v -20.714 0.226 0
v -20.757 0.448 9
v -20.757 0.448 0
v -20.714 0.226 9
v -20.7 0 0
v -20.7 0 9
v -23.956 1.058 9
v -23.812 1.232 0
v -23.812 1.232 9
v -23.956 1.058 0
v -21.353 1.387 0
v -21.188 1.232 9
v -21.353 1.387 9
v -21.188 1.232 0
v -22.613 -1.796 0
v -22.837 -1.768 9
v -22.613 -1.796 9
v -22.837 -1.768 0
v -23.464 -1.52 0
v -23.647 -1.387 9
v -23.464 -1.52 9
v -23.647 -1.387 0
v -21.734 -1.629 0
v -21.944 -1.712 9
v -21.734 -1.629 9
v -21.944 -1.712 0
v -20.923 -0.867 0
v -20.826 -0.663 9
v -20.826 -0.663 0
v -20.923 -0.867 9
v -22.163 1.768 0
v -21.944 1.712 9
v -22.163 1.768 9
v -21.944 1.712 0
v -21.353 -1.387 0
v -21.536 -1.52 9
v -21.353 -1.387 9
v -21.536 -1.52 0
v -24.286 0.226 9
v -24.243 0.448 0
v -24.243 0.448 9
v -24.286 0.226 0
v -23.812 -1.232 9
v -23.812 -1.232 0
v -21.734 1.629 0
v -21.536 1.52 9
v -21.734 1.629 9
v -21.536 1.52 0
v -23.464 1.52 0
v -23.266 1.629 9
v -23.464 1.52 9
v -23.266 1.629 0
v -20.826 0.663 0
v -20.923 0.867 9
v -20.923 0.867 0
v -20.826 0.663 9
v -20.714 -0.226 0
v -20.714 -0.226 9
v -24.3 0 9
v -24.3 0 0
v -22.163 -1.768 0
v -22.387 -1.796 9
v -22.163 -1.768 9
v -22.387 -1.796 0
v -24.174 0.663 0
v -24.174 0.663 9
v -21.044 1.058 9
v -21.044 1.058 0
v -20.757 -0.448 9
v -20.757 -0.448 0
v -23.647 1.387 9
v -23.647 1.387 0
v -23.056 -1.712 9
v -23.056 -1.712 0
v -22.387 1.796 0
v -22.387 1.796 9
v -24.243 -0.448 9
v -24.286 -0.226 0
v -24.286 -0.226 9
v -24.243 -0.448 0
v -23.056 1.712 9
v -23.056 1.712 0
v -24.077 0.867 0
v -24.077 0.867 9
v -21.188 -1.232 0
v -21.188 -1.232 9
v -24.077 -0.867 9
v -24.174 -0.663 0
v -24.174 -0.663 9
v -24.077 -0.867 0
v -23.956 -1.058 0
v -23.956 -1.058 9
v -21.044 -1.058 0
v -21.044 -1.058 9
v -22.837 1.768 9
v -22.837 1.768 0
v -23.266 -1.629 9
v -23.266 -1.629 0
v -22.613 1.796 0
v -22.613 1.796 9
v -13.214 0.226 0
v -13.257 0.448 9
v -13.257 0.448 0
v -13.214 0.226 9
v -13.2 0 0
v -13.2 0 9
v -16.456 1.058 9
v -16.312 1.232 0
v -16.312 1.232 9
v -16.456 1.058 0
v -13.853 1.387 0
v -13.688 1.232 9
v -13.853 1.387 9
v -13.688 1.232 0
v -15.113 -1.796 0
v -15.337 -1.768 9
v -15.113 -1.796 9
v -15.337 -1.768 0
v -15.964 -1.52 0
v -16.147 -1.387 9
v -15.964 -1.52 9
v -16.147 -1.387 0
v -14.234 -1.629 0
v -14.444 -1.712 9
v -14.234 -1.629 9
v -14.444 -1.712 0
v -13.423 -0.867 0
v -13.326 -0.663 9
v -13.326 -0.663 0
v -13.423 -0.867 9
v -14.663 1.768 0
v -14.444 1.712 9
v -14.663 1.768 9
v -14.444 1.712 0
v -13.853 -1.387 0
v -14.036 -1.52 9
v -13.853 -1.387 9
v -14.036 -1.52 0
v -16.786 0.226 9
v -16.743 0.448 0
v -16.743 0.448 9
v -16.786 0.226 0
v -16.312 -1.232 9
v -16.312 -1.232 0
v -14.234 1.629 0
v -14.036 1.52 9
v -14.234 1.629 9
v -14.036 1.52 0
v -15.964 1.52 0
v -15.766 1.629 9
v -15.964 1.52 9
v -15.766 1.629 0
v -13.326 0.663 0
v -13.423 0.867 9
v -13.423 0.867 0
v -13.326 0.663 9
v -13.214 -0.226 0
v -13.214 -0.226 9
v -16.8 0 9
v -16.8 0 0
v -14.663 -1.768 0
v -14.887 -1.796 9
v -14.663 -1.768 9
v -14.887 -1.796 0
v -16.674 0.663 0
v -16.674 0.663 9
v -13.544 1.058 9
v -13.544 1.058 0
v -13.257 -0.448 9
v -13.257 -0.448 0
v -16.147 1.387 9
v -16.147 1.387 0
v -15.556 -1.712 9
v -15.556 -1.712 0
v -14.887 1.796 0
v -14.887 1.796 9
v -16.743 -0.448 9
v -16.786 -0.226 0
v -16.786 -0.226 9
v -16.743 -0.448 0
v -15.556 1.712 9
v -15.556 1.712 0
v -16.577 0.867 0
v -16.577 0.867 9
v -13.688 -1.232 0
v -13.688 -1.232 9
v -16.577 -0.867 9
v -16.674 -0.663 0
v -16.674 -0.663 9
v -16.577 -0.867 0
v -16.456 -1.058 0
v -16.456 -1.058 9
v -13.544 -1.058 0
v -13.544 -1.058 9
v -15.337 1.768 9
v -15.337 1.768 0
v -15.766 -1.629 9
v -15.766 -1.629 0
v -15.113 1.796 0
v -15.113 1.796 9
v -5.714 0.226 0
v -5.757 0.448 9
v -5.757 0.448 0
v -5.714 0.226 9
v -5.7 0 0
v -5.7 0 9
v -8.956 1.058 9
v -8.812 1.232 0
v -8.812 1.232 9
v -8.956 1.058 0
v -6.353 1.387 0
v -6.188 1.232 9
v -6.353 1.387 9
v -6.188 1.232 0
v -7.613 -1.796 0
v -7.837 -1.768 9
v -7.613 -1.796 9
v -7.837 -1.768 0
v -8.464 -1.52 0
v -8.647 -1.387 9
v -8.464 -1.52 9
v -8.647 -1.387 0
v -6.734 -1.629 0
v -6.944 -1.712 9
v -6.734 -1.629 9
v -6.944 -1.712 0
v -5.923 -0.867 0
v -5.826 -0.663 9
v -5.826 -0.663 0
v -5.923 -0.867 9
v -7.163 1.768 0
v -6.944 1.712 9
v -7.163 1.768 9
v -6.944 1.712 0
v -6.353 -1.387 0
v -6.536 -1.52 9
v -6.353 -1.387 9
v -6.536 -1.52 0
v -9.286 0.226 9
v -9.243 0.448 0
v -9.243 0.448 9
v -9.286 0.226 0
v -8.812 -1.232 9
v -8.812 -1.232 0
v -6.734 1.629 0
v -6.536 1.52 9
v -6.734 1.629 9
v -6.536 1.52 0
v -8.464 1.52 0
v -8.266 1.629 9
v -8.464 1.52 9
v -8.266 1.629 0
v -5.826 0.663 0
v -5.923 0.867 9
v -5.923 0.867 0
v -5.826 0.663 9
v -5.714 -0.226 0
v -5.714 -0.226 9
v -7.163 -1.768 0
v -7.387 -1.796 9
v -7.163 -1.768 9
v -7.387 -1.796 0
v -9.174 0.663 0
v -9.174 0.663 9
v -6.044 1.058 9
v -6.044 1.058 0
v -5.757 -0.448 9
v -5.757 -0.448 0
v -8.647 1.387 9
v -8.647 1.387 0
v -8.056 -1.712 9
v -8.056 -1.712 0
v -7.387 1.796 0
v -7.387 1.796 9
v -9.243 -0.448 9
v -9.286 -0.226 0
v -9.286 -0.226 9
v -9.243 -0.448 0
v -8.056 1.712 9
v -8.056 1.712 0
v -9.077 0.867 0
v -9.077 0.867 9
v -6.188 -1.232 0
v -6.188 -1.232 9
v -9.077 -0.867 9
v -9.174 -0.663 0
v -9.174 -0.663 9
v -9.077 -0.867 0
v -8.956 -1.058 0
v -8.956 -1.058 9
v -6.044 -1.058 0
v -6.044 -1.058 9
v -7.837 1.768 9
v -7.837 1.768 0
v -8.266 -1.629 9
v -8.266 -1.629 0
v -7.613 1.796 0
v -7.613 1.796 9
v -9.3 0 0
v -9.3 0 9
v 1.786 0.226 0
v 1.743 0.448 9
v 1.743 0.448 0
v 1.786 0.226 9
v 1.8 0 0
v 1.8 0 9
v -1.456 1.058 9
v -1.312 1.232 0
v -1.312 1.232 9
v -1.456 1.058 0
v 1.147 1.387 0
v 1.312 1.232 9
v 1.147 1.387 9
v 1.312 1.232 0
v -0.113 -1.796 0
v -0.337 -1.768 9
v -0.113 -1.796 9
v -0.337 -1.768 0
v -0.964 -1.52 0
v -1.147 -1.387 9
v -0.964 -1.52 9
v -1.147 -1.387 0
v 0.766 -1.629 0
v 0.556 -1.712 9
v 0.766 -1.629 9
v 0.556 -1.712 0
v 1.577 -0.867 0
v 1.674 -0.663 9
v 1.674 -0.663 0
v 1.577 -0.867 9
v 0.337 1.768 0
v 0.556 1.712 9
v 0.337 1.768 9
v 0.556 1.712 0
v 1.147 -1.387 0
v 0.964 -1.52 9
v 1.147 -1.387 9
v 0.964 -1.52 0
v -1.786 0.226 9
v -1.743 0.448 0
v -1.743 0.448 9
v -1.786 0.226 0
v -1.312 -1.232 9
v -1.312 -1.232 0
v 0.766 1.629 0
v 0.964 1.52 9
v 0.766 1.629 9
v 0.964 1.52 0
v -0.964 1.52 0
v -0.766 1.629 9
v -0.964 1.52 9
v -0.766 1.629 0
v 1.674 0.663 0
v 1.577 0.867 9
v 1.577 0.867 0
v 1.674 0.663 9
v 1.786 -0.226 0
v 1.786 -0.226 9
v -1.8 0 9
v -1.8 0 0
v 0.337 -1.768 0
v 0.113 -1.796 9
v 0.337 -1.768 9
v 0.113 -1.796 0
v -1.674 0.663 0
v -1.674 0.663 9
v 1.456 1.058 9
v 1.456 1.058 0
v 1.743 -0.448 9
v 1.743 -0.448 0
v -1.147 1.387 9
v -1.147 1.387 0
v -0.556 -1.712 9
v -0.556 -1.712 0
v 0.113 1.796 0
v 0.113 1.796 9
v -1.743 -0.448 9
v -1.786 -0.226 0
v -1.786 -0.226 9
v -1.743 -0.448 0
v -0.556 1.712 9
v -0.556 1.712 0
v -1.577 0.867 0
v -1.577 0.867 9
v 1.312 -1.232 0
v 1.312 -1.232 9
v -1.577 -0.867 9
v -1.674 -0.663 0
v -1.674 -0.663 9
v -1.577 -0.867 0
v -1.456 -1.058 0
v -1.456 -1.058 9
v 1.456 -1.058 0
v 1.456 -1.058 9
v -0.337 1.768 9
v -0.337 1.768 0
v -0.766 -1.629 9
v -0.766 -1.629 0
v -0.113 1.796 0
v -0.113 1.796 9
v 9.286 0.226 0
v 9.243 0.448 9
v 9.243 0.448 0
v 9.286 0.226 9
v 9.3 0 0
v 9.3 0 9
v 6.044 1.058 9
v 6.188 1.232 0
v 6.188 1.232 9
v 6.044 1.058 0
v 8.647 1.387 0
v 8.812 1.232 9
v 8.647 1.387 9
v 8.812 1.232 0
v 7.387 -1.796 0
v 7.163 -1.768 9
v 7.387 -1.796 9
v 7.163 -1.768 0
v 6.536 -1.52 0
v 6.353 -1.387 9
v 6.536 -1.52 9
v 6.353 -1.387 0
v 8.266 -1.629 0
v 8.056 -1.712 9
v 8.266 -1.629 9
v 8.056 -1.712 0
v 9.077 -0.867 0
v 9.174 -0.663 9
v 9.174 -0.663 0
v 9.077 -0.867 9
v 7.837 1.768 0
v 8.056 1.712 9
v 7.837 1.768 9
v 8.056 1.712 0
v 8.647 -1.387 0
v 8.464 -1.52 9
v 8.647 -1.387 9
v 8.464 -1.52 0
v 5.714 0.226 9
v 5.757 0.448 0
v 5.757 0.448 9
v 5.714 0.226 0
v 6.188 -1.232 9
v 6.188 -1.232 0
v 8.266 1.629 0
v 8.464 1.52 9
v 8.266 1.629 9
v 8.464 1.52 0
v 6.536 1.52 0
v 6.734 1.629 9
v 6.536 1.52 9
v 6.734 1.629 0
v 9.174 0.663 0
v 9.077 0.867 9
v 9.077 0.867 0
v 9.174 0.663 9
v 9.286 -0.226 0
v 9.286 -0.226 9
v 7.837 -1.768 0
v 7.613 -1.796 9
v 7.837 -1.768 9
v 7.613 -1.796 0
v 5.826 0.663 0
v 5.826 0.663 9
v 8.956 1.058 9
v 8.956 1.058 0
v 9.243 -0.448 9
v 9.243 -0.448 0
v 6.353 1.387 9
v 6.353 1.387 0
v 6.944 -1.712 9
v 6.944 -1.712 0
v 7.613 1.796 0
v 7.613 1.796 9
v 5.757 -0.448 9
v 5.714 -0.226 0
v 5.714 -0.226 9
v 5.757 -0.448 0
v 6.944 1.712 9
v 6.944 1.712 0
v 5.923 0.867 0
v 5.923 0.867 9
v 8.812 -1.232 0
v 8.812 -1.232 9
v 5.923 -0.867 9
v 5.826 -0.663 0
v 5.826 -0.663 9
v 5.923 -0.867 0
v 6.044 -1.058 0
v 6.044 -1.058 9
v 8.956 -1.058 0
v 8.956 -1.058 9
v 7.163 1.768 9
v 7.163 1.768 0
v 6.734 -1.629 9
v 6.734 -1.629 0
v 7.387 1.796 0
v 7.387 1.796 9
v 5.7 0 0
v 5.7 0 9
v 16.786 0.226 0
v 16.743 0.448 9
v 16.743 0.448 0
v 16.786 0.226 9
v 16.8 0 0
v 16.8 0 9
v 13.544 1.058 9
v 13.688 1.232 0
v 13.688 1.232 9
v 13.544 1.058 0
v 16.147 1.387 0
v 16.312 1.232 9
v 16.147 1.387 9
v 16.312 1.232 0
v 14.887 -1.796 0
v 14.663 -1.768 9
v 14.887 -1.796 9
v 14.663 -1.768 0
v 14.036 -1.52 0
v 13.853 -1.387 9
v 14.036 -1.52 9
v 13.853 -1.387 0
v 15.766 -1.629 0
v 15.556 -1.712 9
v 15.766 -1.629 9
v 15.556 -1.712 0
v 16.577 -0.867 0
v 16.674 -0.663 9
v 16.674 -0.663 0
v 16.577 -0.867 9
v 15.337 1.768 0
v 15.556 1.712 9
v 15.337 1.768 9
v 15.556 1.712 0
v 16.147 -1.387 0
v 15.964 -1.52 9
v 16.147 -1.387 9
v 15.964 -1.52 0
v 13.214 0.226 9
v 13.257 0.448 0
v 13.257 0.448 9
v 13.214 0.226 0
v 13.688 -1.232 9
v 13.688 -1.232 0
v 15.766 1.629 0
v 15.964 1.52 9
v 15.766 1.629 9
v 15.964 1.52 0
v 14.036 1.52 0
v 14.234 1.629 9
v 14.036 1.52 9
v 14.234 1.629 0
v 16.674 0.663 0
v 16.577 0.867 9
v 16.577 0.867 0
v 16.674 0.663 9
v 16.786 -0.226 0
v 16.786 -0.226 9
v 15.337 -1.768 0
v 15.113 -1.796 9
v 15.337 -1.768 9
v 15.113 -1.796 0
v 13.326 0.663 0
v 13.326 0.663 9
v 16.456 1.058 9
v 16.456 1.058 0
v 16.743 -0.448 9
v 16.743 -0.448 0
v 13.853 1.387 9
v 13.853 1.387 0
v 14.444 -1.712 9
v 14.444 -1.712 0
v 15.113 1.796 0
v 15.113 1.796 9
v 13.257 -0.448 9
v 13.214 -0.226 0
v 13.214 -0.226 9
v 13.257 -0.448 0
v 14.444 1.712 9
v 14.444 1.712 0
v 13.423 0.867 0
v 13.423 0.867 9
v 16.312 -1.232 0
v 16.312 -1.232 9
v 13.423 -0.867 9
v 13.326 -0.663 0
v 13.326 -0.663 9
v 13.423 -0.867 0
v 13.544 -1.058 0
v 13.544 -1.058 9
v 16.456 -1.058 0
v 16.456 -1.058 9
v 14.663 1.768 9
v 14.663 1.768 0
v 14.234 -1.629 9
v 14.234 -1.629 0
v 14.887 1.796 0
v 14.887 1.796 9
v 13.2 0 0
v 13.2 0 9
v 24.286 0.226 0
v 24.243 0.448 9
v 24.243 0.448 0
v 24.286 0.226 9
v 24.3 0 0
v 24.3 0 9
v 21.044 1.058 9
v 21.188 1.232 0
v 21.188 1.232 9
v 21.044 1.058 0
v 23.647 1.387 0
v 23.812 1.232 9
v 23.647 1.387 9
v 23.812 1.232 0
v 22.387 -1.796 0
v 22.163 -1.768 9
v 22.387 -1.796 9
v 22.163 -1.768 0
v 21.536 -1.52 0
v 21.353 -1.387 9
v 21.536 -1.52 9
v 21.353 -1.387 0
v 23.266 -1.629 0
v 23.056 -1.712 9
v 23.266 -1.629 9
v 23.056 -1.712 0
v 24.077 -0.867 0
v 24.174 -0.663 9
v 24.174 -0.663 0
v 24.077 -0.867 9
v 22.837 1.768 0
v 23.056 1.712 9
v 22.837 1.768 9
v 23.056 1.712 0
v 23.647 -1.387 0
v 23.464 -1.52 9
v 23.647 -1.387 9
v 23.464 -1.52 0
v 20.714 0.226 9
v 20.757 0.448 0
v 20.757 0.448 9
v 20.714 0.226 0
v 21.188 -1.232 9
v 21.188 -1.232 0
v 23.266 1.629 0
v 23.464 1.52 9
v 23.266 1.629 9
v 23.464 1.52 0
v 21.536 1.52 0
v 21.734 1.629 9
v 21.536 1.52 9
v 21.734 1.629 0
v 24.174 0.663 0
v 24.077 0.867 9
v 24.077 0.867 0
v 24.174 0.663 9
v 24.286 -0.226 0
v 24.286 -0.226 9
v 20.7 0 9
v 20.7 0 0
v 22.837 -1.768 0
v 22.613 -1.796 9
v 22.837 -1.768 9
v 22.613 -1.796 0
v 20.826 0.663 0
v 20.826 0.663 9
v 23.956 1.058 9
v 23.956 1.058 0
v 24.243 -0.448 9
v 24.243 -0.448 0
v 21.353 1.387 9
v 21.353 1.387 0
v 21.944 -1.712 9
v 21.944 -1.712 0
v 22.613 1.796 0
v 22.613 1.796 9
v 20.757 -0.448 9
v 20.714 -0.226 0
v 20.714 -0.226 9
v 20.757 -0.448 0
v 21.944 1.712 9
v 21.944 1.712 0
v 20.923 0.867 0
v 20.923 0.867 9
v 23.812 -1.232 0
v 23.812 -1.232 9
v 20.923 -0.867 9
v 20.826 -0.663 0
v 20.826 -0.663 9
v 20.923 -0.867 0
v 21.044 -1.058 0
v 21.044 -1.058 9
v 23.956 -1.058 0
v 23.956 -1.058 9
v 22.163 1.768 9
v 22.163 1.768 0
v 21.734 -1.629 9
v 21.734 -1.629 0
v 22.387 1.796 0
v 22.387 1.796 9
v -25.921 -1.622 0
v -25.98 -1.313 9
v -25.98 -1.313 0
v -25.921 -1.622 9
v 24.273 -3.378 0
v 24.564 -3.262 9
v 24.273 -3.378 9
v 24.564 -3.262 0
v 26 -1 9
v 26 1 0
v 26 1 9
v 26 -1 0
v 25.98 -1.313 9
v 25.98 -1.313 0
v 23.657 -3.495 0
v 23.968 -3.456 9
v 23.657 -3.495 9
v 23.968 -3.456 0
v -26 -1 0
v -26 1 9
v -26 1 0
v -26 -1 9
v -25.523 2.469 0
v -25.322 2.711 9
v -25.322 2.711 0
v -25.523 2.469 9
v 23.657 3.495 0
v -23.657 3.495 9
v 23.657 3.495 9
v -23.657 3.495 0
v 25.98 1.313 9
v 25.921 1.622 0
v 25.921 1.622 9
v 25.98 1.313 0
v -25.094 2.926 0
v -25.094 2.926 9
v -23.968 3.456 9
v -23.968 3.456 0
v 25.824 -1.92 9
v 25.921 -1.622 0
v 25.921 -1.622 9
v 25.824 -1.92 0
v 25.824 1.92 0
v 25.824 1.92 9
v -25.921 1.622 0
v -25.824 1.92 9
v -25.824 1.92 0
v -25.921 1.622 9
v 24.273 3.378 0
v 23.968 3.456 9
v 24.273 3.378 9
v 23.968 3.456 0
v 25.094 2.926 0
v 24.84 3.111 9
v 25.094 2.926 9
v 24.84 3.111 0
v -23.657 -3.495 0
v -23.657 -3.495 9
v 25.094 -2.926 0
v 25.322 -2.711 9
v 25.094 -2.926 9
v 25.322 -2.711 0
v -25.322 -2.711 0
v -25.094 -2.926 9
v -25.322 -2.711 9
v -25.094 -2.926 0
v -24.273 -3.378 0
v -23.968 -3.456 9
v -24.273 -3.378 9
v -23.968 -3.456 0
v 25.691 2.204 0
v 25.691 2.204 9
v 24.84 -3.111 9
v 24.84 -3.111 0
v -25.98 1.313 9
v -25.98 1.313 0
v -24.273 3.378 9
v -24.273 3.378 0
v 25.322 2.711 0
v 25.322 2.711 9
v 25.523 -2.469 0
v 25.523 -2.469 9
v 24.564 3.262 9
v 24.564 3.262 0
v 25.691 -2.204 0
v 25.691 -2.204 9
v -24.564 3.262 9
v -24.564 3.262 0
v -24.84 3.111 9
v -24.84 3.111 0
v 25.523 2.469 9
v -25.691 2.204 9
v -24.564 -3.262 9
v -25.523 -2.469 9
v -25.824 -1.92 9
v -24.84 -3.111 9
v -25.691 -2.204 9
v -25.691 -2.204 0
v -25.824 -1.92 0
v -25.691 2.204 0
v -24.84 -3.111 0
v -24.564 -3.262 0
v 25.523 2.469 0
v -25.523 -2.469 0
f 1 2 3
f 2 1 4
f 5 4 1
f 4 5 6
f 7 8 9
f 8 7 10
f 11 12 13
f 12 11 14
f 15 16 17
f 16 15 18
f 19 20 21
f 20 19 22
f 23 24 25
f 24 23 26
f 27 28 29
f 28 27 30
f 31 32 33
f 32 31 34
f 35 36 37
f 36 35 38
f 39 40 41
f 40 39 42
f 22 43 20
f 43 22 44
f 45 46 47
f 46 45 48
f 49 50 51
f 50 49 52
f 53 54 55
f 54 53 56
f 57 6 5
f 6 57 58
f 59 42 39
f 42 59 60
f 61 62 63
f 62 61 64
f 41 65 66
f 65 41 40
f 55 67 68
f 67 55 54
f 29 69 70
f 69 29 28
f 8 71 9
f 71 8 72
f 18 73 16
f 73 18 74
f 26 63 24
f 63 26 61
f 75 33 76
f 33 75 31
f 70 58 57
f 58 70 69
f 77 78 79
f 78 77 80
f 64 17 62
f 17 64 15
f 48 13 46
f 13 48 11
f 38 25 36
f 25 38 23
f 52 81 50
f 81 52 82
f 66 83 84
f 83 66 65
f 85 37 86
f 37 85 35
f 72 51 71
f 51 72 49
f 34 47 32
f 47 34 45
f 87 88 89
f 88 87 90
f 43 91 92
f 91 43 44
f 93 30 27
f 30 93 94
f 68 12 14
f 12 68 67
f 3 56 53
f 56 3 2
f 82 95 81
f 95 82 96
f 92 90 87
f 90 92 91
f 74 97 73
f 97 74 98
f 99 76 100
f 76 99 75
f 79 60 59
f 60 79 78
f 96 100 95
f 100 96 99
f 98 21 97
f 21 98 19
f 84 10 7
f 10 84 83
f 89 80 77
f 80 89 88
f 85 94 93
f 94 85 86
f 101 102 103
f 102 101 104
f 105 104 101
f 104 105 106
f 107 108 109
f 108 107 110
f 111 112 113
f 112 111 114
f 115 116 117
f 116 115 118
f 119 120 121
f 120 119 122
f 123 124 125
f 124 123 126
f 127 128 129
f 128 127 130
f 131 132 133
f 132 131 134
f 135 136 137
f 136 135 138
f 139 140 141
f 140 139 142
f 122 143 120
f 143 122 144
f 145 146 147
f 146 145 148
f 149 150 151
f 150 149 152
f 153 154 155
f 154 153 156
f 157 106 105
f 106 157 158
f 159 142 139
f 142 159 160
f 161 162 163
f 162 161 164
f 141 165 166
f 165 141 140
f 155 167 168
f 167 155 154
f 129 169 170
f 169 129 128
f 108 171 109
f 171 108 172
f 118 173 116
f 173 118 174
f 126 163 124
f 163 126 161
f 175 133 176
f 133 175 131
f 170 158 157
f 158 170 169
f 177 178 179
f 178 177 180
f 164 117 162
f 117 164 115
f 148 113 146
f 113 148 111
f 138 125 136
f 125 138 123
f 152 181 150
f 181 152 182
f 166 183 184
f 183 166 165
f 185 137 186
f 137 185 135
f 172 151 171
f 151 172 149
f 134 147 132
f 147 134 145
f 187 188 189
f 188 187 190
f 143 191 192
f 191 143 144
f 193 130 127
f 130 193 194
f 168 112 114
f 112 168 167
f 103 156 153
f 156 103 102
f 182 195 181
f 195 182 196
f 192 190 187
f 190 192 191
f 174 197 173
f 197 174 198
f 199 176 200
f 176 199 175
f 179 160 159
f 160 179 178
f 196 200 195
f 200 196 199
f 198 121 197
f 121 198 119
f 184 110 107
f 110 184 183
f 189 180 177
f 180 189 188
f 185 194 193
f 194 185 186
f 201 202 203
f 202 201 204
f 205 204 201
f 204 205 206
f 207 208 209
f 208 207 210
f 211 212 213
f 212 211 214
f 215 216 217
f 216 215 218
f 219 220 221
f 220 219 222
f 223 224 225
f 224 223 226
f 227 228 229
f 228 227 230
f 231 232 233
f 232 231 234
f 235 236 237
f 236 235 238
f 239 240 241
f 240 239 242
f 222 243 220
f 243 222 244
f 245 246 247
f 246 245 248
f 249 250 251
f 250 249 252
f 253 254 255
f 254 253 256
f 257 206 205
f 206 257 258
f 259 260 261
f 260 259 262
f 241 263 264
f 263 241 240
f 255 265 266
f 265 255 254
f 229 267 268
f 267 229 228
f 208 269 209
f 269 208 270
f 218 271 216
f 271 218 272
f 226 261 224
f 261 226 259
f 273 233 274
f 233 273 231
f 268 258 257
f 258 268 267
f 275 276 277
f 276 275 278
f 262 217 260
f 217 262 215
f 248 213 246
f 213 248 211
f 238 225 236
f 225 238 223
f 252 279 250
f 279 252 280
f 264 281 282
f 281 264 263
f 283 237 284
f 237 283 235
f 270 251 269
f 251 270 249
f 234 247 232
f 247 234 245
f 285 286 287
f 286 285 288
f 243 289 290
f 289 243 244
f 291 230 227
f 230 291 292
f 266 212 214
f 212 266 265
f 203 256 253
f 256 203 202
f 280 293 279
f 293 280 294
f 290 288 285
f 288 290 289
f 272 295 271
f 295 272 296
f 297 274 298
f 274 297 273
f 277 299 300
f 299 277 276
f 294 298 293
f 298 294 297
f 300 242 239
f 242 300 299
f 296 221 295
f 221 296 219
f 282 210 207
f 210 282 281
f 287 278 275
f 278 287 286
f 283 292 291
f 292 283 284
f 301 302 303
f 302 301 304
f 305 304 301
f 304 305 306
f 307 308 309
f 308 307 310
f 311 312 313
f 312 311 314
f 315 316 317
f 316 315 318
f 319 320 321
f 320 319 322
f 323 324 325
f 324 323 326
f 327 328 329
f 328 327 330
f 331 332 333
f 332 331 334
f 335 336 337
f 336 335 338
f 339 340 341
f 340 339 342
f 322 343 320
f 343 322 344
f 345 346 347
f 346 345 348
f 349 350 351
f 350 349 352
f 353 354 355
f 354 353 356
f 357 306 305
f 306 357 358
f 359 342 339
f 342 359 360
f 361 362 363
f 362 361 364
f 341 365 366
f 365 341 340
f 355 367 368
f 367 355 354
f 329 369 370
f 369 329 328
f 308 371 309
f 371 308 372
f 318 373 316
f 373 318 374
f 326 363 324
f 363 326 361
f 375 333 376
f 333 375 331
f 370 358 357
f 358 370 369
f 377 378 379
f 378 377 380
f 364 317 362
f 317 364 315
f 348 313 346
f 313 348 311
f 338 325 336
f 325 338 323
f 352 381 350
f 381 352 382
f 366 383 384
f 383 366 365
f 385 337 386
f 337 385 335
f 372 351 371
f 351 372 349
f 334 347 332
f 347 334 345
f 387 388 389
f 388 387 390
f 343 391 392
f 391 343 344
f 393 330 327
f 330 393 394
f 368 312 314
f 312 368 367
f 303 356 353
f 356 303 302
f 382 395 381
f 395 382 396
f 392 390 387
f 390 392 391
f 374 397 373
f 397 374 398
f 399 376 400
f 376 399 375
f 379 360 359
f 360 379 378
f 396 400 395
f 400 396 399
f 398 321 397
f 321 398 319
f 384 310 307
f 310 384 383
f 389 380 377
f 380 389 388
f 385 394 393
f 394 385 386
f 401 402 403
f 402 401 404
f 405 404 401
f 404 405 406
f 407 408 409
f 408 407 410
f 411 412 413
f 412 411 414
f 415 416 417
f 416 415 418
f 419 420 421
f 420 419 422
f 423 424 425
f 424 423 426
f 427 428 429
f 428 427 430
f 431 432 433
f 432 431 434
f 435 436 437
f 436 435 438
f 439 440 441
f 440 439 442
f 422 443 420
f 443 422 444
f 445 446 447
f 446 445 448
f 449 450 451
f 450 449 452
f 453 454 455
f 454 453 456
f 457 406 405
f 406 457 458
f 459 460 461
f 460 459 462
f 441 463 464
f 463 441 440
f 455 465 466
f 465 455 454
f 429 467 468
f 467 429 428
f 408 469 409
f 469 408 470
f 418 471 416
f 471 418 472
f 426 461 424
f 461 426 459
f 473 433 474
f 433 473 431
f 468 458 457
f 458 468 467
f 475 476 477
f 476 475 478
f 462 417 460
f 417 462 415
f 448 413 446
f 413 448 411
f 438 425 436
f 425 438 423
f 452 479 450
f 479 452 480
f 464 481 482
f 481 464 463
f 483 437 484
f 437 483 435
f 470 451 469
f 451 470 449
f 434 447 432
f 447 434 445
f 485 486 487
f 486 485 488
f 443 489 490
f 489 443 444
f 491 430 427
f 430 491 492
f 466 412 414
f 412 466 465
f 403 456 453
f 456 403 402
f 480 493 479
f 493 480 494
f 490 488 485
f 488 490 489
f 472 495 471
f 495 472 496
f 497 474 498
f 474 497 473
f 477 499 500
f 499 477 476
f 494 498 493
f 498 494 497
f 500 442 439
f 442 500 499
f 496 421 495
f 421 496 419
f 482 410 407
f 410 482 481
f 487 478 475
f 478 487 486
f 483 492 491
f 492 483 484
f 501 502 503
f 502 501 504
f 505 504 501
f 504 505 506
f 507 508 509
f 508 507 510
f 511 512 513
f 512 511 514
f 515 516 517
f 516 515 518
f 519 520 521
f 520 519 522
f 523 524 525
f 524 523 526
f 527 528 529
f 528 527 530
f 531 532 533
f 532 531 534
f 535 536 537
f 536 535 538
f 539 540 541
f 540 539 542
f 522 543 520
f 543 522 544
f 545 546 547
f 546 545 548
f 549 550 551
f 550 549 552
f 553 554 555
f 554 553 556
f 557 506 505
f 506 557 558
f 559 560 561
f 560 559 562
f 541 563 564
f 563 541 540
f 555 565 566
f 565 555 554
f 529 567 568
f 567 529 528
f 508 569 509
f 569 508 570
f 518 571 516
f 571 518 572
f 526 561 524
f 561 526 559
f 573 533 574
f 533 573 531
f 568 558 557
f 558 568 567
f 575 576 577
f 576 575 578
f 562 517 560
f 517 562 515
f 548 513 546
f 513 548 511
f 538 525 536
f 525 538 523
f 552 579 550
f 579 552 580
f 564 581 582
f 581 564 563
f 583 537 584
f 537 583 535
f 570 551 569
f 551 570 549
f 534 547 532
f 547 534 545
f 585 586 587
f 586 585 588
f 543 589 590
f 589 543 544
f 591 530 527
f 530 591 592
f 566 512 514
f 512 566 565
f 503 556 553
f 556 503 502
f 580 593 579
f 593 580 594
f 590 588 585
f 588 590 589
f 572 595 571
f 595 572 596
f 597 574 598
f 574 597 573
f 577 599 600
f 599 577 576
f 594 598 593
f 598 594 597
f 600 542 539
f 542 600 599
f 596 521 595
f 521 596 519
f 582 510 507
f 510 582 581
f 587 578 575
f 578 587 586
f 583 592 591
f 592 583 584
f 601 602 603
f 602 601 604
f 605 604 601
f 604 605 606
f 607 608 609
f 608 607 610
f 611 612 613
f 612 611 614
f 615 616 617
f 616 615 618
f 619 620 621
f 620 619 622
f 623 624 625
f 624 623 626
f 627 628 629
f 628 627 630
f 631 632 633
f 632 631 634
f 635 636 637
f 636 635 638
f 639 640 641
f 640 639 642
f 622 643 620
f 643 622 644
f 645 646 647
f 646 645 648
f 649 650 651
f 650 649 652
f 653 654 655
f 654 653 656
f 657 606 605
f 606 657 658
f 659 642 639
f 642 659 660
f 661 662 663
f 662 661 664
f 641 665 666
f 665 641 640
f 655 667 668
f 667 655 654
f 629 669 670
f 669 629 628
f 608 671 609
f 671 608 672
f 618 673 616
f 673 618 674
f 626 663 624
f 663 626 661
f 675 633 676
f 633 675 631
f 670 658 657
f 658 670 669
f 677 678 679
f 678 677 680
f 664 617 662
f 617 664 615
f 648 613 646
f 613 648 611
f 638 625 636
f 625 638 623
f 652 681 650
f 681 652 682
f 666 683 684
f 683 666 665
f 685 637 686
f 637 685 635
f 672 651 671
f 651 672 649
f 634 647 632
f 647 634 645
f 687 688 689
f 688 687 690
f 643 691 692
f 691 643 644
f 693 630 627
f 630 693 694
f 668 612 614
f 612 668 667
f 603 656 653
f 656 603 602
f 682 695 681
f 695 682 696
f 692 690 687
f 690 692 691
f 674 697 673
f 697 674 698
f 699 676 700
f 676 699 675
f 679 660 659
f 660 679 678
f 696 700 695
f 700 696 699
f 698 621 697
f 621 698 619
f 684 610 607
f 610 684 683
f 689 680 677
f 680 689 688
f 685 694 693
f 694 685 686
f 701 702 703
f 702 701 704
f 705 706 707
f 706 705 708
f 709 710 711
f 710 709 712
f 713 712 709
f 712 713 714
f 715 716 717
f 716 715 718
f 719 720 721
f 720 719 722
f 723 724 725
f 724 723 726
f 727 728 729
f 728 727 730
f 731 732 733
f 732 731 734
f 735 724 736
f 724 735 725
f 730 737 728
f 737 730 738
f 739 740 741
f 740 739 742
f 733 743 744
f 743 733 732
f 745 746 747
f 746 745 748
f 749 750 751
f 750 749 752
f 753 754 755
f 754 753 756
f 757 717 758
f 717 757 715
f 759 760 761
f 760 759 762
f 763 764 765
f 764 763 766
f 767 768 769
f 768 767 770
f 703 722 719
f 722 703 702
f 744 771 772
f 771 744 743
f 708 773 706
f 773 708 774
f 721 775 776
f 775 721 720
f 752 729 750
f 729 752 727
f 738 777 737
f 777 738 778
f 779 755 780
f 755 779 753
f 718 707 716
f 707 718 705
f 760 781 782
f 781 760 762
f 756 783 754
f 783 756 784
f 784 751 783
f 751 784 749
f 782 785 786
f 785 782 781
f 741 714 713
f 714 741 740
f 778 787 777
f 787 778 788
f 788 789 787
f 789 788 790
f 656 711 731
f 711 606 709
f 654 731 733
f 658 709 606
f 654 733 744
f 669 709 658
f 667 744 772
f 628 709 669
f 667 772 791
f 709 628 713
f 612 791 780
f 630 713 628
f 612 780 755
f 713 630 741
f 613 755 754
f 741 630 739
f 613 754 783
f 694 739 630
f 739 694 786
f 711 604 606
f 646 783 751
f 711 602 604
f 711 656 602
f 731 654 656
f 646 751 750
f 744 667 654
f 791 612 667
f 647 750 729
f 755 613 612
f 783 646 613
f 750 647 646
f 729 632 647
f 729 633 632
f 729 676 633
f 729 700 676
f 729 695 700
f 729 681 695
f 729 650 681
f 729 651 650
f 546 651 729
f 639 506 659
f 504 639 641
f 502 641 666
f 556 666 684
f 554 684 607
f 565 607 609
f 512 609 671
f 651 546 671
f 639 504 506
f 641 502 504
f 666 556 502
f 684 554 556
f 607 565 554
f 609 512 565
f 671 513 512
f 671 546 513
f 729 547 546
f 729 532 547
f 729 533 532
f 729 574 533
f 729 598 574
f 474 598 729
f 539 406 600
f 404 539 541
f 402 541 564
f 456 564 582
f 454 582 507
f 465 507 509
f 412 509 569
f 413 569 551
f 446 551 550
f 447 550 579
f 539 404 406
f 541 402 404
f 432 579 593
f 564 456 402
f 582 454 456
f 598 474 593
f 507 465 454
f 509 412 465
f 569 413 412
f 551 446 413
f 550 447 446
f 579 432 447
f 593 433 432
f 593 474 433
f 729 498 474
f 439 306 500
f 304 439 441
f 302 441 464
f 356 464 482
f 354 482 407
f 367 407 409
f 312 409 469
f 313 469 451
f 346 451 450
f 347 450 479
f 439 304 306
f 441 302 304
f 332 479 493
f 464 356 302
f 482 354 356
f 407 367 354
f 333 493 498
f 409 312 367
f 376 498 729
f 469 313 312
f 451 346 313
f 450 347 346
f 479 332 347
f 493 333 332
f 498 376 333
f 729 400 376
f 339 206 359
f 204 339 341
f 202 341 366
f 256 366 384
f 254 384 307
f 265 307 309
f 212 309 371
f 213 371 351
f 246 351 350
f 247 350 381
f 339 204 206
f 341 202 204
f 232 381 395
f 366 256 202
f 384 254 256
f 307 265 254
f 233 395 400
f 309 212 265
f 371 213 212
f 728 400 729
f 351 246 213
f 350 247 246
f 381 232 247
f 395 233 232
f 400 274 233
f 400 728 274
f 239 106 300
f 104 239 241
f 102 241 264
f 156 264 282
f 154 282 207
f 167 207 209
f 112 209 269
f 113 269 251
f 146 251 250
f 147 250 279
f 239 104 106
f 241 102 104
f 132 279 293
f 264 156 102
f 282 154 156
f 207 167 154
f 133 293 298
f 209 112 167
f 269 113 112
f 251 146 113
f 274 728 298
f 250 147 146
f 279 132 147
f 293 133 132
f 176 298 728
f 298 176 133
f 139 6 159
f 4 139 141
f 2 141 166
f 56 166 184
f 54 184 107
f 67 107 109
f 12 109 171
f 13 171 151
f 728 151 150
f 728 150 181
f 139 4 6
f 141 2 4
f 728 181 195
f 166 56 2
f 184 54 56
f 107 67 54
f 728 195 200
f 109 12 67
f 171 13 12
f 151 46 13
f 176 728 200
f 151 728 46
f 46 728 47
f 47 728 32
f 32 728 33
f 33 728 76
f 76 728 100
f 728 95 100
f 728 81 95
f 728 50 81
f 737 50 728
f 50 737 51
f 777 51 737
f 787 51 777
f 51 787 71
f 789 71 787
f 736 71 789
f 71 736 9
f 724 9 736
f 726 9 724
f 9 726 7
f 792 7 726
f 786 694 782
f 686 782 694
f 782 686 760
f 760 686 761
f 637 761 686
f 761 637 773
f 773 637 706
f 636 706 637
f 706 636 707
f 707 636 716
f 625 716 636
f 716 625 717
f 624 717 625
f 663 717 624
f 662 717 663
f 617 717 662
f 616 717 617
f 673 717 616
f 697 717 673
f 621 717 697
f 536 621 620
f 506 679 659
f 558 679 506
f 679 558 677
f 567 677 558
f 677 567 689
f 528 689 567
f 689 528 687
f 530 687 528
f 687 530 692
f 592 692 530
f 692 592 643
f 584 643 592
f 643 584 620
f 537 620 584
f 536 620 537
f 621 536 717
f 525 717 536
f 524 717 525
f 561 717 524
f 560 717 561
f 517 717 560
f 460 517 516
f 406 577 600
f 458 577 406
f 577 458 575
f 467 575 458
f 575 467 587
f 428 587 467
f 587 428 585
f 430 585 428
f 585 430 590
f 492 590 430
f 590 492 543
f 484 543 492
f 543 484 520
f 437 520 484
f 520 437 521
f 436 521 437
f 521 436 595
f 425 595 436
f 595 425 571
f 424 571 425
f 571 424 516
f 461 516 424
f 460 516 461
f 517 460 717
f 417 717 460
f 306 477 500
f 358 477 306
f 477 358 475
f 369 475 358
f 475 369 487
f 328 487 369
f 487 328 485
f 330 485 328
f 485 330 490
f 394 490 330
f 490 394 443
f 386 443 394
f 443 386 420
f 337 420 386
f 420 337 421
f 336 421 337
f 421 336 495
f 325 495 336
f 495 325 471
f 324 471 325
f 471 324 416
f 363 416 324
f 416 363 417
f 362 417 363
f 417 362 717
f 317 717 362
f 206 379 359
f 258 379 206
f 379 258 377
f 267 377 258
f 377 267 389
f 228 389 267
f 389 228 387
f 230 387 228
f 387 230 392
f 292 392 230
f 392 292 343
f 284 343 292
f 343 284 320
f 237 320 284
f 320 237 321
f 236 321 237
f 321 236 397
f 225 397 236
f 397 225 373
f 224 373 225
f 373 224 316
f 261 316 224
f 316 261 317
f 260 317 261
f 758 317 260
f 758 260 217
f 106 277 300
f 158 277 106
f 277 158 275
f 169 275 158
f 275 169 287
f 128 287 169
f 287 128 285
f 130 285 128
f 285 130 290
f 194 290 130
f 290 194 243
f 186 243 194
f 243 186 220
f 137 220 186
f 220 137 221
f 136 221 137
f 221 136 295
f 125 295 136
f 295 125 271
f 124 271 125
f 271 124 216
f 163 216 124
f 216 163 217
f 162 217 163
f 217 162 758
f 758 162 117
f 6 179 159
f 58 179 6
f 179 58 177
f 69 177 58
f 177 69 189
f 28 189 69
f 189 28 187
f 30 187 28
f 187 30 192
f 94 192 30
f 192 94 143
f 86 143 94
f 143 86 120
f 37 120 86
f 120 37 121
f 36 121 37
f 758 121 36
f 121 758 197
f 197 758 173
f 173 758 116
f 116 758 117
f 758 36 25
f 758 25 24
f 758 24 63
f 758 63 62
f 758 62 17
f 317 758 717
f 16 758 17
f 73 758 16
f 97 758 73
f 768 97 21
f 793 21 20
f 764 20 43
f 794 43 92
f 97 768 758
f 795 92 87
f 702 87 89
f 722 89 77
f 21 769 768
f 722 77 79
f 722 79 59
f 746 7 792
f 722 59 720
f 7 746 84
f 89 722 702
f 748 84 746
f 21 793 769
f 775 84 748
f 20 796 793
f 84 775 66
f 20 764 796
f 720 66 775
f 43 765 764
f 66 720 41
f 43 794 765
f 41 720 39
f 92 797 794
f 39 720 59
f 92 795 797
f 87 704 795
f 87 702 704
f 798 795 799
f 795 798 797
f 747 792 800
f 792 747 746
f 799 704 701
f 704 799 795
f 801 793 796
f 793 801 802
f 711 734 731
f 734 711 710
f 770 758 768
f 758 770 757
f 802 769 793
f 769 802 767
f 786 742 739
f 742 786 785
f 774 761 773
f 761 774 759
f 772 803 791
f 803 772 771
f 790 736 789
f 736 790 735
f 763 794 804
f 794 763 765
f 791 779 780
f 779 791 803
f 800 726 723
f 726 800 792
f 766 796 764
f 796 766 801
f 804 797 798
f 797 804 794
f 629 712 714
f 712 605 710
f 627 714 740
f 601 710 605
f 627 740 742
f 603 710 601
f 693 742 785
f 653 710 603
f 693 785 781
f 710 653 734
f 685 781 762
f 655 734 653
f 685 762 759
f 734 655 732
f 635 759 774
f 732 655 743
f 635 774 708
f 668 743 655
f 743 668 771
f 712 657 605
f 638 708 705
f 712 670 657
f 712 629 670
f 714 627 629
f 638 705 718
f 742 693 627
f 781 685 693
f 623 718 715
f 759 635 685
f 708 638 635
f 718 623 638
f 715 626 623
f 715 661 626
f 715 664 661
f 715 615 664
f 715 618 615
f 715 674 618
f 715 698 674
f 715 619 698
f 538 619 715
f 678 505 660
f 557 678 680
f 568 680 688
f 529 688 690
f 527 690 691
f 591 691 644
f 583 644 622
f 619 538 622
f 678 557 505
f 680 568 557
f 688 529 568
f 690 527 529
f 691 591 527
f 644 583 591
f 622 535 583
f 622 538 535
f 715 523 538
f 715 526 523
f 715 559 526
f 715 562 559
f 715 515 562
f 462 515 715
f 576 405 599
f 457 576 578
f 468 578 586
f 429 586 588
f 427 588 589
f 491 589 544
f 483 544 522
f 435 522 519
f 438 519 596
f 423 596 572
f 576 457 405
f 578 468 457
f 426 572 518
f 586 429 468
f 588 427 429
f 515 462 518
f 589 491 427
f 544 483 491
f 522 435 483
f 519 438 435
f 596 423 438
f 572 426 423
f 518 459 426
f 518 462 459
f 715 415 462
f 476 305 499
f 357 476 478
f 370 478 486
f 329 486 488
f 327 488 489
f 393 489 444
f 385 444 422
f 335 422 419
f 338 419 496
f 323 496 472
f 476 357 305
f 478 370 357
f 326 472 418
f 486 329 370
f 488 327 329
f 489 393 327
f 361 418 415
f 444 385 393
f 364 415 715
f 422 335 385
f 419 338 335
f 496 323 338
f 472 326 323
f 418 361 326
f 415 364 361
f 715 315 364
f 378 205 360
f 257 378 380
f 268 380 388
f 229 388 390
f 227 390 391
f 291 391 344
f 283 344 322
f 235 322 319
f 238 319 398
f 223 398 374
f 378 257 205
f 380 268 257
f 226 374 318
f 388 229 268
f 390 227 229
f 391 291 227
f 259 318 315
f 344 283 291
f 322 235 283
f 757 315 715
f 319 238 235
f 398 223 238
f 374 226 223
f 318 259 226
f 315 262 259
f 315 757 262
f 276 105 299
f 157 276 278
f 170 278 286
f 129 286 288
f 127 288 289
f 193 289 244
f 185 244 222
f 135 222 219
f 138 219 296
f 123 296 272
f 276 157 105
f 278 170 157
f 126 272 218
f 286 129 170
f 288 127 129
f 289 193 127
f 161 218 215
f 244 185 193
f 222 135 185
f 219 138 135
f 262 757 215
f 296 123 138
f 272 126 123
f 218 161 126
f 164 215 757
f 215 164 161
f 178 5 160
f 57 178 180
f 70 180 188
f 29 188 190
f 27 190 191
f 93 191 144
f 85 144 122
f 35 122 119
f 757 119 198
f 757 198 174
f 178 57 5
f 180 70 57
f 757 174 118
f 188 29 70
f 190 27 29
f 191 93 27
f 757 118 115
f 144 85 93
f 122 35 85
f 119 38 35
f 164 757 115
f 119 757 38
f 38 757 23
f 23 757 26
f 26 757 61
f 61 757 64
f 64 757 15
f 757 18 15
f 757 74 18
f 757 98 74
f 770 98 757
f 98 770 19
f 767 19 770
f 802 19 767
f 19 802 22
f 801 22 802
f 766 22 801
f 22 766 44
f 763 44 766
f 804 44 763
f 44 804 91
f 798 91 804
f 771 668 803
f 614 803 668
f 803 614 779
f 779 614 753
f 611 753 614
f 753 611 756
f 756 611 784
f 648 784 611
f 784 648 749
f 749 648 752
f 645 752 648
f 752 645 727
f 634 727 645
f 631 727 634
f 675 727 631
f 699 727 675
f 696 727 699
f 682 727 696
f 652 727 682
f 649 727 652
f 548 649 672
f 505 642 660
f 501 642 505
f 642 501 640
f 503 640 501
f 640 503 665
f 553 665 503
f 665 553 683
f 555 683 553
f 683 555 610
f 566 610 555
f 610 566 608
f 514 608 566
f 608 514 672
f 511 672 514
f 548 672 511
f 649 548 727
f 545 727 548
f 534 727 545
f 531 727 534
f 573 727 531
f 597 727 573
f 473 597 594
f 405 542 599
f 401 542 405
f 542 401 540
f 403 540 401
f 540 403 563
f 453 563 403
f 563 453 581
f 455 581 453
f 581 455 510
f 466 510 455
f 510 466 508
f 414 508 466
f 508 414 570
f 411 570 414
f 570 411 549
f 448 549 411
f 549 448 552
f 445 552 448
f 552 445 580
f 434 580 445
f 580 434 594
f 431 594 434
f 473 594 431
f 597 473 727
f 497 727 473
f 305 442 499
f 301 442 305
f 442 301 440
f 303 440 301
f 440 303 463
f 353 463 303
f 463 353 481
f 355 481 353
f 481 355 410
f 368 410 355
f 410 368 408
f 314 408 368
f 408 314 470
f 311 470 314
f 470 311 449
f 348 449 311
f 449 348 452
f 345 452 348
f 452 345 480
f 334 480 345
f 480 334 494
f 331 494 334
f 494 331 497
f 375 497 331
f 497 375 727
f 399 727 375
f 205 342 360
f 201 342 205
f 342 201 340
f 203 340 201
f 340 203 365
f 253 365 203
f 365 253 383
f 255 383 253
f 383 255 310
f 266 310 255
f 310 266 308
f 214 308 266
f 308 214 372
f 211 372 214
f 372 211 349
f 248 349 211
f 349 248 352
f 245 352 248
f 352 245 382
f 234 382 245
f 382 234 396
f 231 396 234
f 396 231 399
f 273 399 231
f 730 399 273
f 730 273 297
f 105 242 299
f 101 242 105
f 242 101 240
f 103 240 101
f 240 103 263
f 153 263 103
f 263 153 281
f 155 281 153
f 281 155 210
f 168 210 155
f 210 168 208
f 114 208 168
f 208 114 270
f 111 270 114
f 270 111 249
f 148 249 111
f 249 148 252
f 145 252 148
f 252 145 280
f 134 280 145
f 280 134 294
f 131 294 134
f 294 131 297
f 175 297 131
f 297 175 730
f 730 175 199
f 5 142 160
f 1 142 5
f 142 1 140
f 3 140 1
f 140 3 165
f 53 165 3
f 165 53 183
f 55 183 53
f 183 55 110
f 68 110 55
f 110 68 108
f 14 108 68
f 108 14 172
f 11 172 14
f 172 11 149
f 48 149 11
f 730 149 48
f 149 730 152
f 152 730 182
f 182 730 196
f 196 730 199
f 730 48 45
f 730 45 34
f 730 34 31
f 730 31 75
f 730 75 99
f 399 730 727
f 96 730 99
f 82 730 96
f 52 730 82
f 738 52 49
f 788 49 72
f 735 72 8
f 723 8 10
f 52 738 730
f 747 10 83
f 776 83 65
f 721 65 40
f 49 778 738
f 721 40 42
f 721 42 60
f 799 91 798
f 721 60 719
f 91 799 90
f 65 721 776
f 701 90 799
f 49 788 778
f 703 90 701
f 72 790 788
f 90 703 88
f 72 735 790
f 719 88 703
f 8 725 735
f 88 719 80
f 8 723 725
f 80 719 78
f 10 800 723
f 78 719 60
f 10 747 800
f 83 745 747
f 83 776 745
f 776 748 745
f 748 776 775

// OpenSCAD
$fn = 50;


difference() {
	union() {
		translate(v = [0, 0, 0]) {
			rotate(a = [0, 0, 0]) {
				hull() {
					translate(v = [-23.5000000000, 1.0000000000, 0]) {
						rotate(a = [0, 0, 0]) {
							translate(v = [0, 0, 0]) {
								rotate(a = [0, 0, 0]) {
									cylinder(h = 9, r = 2.5000000000);
								}
							}
						}
					}
					translate(v = [23.5000000000, 1.0000000000, 0]) {
						rotate(a = [0, 0, 0]) {
							translate(v = [0, 0, 0]) {
								rotate(a = [0, 0, 0]) {
									cylinder(h = 9, r = 2.5000000000);
								}
							}
						}
					}
					translate(v = [-23.5000000000, -1.0000000000, 0]) {
						rotate(a = [0, 0, 0]) {
							translate(v = [0, 0, 0]) {
								rotate(a = [0, 0, 0]) {
									cylinder(h = 9, r = 2.5000000000);
								}
							}
						}
					}
					translate(v = [23.5000000000, -1.0000000000, 0]) {
						rotate(a = [0, 0, 0]) {
							translate(v = [0, 0, 0]) {
								rotate(a = [0, 0, 0]) {
									cylinder(h = 9, r = 2.5000000000);
								}
							}
						}
					}
				}
			}
		}
	}
	union() {
		translate(v = [-22.5000000000, 0.0000000000, 0]) {
			rotate(a = [0, 0, 0]) {
				translate(v = [0, 0, -50]) {
					rotate(a = [0, 0, 0]) {
						cylinder(h = 100, r = 1.8000000000);
					}
				}
			}
		}
		translate(v = [-15.0000000000, 0.0000000000, 0]) {
			rotate(a = [0, 0, 0]) {
				translate(v = [0, 0, -50]) {
					rotate(a = [0, 0, 0]) {
						cylinder(h = 100, r = 1.8000000000);
					}
				}
			}
		}
		translate(v = [-7.5000000000, 0.0000000000, 0]) {
			rotate(a = [0, 0, 0]) {
				translate(v = [0, 0, -50]) {
					rotate(a = [0, 0, 0]) {
						cylinder(h = 100, r = 1.8000000000);
					}
				}
			}
		}
		translate(v = [0.0000000000, 0.0000000000, 0]) {
			rotate(a = [0, 0, 0]) {
				translate(v = [0, 0, -50]) {
					rotate(a = [0, 0, 0]) {
						cylinder(h = 100, r = 1.8000000000);
					}
				}
			}
		}
		translate(v = [7.5000000000, 0.0000000000, 0]) {
			rotate(a = [0, 0, 0]) {
				translate(v = [0, 0, -50]) {
					rotate(a = [0, 0, 0]) {
						cylinder(h = 100, r = 1.8000000000);
					}
				}
			}
		}
		translate(v = [15.0000000000, 0.0000000000, 0]) {
			rotate(a = [0, 0, 0]) {
				translate(v = [0, 0, -50]) {
					rotate(a = [0, 0, 0]) {
						cylinder(h = 100, r = 1.8000000000);
					}
				}
			}
		}
		translate(v = [22.5000000000, 0.0000000000, 0]) {
			rotate(a = [0, 0, 0]) {
				translate(v = [0, 0, -50]) {
					rotate(a = [0, 0, 0]) {
						cylinder(h = 100, r = 1.8000000000);
					}
				}
			}
		}
	}
}
